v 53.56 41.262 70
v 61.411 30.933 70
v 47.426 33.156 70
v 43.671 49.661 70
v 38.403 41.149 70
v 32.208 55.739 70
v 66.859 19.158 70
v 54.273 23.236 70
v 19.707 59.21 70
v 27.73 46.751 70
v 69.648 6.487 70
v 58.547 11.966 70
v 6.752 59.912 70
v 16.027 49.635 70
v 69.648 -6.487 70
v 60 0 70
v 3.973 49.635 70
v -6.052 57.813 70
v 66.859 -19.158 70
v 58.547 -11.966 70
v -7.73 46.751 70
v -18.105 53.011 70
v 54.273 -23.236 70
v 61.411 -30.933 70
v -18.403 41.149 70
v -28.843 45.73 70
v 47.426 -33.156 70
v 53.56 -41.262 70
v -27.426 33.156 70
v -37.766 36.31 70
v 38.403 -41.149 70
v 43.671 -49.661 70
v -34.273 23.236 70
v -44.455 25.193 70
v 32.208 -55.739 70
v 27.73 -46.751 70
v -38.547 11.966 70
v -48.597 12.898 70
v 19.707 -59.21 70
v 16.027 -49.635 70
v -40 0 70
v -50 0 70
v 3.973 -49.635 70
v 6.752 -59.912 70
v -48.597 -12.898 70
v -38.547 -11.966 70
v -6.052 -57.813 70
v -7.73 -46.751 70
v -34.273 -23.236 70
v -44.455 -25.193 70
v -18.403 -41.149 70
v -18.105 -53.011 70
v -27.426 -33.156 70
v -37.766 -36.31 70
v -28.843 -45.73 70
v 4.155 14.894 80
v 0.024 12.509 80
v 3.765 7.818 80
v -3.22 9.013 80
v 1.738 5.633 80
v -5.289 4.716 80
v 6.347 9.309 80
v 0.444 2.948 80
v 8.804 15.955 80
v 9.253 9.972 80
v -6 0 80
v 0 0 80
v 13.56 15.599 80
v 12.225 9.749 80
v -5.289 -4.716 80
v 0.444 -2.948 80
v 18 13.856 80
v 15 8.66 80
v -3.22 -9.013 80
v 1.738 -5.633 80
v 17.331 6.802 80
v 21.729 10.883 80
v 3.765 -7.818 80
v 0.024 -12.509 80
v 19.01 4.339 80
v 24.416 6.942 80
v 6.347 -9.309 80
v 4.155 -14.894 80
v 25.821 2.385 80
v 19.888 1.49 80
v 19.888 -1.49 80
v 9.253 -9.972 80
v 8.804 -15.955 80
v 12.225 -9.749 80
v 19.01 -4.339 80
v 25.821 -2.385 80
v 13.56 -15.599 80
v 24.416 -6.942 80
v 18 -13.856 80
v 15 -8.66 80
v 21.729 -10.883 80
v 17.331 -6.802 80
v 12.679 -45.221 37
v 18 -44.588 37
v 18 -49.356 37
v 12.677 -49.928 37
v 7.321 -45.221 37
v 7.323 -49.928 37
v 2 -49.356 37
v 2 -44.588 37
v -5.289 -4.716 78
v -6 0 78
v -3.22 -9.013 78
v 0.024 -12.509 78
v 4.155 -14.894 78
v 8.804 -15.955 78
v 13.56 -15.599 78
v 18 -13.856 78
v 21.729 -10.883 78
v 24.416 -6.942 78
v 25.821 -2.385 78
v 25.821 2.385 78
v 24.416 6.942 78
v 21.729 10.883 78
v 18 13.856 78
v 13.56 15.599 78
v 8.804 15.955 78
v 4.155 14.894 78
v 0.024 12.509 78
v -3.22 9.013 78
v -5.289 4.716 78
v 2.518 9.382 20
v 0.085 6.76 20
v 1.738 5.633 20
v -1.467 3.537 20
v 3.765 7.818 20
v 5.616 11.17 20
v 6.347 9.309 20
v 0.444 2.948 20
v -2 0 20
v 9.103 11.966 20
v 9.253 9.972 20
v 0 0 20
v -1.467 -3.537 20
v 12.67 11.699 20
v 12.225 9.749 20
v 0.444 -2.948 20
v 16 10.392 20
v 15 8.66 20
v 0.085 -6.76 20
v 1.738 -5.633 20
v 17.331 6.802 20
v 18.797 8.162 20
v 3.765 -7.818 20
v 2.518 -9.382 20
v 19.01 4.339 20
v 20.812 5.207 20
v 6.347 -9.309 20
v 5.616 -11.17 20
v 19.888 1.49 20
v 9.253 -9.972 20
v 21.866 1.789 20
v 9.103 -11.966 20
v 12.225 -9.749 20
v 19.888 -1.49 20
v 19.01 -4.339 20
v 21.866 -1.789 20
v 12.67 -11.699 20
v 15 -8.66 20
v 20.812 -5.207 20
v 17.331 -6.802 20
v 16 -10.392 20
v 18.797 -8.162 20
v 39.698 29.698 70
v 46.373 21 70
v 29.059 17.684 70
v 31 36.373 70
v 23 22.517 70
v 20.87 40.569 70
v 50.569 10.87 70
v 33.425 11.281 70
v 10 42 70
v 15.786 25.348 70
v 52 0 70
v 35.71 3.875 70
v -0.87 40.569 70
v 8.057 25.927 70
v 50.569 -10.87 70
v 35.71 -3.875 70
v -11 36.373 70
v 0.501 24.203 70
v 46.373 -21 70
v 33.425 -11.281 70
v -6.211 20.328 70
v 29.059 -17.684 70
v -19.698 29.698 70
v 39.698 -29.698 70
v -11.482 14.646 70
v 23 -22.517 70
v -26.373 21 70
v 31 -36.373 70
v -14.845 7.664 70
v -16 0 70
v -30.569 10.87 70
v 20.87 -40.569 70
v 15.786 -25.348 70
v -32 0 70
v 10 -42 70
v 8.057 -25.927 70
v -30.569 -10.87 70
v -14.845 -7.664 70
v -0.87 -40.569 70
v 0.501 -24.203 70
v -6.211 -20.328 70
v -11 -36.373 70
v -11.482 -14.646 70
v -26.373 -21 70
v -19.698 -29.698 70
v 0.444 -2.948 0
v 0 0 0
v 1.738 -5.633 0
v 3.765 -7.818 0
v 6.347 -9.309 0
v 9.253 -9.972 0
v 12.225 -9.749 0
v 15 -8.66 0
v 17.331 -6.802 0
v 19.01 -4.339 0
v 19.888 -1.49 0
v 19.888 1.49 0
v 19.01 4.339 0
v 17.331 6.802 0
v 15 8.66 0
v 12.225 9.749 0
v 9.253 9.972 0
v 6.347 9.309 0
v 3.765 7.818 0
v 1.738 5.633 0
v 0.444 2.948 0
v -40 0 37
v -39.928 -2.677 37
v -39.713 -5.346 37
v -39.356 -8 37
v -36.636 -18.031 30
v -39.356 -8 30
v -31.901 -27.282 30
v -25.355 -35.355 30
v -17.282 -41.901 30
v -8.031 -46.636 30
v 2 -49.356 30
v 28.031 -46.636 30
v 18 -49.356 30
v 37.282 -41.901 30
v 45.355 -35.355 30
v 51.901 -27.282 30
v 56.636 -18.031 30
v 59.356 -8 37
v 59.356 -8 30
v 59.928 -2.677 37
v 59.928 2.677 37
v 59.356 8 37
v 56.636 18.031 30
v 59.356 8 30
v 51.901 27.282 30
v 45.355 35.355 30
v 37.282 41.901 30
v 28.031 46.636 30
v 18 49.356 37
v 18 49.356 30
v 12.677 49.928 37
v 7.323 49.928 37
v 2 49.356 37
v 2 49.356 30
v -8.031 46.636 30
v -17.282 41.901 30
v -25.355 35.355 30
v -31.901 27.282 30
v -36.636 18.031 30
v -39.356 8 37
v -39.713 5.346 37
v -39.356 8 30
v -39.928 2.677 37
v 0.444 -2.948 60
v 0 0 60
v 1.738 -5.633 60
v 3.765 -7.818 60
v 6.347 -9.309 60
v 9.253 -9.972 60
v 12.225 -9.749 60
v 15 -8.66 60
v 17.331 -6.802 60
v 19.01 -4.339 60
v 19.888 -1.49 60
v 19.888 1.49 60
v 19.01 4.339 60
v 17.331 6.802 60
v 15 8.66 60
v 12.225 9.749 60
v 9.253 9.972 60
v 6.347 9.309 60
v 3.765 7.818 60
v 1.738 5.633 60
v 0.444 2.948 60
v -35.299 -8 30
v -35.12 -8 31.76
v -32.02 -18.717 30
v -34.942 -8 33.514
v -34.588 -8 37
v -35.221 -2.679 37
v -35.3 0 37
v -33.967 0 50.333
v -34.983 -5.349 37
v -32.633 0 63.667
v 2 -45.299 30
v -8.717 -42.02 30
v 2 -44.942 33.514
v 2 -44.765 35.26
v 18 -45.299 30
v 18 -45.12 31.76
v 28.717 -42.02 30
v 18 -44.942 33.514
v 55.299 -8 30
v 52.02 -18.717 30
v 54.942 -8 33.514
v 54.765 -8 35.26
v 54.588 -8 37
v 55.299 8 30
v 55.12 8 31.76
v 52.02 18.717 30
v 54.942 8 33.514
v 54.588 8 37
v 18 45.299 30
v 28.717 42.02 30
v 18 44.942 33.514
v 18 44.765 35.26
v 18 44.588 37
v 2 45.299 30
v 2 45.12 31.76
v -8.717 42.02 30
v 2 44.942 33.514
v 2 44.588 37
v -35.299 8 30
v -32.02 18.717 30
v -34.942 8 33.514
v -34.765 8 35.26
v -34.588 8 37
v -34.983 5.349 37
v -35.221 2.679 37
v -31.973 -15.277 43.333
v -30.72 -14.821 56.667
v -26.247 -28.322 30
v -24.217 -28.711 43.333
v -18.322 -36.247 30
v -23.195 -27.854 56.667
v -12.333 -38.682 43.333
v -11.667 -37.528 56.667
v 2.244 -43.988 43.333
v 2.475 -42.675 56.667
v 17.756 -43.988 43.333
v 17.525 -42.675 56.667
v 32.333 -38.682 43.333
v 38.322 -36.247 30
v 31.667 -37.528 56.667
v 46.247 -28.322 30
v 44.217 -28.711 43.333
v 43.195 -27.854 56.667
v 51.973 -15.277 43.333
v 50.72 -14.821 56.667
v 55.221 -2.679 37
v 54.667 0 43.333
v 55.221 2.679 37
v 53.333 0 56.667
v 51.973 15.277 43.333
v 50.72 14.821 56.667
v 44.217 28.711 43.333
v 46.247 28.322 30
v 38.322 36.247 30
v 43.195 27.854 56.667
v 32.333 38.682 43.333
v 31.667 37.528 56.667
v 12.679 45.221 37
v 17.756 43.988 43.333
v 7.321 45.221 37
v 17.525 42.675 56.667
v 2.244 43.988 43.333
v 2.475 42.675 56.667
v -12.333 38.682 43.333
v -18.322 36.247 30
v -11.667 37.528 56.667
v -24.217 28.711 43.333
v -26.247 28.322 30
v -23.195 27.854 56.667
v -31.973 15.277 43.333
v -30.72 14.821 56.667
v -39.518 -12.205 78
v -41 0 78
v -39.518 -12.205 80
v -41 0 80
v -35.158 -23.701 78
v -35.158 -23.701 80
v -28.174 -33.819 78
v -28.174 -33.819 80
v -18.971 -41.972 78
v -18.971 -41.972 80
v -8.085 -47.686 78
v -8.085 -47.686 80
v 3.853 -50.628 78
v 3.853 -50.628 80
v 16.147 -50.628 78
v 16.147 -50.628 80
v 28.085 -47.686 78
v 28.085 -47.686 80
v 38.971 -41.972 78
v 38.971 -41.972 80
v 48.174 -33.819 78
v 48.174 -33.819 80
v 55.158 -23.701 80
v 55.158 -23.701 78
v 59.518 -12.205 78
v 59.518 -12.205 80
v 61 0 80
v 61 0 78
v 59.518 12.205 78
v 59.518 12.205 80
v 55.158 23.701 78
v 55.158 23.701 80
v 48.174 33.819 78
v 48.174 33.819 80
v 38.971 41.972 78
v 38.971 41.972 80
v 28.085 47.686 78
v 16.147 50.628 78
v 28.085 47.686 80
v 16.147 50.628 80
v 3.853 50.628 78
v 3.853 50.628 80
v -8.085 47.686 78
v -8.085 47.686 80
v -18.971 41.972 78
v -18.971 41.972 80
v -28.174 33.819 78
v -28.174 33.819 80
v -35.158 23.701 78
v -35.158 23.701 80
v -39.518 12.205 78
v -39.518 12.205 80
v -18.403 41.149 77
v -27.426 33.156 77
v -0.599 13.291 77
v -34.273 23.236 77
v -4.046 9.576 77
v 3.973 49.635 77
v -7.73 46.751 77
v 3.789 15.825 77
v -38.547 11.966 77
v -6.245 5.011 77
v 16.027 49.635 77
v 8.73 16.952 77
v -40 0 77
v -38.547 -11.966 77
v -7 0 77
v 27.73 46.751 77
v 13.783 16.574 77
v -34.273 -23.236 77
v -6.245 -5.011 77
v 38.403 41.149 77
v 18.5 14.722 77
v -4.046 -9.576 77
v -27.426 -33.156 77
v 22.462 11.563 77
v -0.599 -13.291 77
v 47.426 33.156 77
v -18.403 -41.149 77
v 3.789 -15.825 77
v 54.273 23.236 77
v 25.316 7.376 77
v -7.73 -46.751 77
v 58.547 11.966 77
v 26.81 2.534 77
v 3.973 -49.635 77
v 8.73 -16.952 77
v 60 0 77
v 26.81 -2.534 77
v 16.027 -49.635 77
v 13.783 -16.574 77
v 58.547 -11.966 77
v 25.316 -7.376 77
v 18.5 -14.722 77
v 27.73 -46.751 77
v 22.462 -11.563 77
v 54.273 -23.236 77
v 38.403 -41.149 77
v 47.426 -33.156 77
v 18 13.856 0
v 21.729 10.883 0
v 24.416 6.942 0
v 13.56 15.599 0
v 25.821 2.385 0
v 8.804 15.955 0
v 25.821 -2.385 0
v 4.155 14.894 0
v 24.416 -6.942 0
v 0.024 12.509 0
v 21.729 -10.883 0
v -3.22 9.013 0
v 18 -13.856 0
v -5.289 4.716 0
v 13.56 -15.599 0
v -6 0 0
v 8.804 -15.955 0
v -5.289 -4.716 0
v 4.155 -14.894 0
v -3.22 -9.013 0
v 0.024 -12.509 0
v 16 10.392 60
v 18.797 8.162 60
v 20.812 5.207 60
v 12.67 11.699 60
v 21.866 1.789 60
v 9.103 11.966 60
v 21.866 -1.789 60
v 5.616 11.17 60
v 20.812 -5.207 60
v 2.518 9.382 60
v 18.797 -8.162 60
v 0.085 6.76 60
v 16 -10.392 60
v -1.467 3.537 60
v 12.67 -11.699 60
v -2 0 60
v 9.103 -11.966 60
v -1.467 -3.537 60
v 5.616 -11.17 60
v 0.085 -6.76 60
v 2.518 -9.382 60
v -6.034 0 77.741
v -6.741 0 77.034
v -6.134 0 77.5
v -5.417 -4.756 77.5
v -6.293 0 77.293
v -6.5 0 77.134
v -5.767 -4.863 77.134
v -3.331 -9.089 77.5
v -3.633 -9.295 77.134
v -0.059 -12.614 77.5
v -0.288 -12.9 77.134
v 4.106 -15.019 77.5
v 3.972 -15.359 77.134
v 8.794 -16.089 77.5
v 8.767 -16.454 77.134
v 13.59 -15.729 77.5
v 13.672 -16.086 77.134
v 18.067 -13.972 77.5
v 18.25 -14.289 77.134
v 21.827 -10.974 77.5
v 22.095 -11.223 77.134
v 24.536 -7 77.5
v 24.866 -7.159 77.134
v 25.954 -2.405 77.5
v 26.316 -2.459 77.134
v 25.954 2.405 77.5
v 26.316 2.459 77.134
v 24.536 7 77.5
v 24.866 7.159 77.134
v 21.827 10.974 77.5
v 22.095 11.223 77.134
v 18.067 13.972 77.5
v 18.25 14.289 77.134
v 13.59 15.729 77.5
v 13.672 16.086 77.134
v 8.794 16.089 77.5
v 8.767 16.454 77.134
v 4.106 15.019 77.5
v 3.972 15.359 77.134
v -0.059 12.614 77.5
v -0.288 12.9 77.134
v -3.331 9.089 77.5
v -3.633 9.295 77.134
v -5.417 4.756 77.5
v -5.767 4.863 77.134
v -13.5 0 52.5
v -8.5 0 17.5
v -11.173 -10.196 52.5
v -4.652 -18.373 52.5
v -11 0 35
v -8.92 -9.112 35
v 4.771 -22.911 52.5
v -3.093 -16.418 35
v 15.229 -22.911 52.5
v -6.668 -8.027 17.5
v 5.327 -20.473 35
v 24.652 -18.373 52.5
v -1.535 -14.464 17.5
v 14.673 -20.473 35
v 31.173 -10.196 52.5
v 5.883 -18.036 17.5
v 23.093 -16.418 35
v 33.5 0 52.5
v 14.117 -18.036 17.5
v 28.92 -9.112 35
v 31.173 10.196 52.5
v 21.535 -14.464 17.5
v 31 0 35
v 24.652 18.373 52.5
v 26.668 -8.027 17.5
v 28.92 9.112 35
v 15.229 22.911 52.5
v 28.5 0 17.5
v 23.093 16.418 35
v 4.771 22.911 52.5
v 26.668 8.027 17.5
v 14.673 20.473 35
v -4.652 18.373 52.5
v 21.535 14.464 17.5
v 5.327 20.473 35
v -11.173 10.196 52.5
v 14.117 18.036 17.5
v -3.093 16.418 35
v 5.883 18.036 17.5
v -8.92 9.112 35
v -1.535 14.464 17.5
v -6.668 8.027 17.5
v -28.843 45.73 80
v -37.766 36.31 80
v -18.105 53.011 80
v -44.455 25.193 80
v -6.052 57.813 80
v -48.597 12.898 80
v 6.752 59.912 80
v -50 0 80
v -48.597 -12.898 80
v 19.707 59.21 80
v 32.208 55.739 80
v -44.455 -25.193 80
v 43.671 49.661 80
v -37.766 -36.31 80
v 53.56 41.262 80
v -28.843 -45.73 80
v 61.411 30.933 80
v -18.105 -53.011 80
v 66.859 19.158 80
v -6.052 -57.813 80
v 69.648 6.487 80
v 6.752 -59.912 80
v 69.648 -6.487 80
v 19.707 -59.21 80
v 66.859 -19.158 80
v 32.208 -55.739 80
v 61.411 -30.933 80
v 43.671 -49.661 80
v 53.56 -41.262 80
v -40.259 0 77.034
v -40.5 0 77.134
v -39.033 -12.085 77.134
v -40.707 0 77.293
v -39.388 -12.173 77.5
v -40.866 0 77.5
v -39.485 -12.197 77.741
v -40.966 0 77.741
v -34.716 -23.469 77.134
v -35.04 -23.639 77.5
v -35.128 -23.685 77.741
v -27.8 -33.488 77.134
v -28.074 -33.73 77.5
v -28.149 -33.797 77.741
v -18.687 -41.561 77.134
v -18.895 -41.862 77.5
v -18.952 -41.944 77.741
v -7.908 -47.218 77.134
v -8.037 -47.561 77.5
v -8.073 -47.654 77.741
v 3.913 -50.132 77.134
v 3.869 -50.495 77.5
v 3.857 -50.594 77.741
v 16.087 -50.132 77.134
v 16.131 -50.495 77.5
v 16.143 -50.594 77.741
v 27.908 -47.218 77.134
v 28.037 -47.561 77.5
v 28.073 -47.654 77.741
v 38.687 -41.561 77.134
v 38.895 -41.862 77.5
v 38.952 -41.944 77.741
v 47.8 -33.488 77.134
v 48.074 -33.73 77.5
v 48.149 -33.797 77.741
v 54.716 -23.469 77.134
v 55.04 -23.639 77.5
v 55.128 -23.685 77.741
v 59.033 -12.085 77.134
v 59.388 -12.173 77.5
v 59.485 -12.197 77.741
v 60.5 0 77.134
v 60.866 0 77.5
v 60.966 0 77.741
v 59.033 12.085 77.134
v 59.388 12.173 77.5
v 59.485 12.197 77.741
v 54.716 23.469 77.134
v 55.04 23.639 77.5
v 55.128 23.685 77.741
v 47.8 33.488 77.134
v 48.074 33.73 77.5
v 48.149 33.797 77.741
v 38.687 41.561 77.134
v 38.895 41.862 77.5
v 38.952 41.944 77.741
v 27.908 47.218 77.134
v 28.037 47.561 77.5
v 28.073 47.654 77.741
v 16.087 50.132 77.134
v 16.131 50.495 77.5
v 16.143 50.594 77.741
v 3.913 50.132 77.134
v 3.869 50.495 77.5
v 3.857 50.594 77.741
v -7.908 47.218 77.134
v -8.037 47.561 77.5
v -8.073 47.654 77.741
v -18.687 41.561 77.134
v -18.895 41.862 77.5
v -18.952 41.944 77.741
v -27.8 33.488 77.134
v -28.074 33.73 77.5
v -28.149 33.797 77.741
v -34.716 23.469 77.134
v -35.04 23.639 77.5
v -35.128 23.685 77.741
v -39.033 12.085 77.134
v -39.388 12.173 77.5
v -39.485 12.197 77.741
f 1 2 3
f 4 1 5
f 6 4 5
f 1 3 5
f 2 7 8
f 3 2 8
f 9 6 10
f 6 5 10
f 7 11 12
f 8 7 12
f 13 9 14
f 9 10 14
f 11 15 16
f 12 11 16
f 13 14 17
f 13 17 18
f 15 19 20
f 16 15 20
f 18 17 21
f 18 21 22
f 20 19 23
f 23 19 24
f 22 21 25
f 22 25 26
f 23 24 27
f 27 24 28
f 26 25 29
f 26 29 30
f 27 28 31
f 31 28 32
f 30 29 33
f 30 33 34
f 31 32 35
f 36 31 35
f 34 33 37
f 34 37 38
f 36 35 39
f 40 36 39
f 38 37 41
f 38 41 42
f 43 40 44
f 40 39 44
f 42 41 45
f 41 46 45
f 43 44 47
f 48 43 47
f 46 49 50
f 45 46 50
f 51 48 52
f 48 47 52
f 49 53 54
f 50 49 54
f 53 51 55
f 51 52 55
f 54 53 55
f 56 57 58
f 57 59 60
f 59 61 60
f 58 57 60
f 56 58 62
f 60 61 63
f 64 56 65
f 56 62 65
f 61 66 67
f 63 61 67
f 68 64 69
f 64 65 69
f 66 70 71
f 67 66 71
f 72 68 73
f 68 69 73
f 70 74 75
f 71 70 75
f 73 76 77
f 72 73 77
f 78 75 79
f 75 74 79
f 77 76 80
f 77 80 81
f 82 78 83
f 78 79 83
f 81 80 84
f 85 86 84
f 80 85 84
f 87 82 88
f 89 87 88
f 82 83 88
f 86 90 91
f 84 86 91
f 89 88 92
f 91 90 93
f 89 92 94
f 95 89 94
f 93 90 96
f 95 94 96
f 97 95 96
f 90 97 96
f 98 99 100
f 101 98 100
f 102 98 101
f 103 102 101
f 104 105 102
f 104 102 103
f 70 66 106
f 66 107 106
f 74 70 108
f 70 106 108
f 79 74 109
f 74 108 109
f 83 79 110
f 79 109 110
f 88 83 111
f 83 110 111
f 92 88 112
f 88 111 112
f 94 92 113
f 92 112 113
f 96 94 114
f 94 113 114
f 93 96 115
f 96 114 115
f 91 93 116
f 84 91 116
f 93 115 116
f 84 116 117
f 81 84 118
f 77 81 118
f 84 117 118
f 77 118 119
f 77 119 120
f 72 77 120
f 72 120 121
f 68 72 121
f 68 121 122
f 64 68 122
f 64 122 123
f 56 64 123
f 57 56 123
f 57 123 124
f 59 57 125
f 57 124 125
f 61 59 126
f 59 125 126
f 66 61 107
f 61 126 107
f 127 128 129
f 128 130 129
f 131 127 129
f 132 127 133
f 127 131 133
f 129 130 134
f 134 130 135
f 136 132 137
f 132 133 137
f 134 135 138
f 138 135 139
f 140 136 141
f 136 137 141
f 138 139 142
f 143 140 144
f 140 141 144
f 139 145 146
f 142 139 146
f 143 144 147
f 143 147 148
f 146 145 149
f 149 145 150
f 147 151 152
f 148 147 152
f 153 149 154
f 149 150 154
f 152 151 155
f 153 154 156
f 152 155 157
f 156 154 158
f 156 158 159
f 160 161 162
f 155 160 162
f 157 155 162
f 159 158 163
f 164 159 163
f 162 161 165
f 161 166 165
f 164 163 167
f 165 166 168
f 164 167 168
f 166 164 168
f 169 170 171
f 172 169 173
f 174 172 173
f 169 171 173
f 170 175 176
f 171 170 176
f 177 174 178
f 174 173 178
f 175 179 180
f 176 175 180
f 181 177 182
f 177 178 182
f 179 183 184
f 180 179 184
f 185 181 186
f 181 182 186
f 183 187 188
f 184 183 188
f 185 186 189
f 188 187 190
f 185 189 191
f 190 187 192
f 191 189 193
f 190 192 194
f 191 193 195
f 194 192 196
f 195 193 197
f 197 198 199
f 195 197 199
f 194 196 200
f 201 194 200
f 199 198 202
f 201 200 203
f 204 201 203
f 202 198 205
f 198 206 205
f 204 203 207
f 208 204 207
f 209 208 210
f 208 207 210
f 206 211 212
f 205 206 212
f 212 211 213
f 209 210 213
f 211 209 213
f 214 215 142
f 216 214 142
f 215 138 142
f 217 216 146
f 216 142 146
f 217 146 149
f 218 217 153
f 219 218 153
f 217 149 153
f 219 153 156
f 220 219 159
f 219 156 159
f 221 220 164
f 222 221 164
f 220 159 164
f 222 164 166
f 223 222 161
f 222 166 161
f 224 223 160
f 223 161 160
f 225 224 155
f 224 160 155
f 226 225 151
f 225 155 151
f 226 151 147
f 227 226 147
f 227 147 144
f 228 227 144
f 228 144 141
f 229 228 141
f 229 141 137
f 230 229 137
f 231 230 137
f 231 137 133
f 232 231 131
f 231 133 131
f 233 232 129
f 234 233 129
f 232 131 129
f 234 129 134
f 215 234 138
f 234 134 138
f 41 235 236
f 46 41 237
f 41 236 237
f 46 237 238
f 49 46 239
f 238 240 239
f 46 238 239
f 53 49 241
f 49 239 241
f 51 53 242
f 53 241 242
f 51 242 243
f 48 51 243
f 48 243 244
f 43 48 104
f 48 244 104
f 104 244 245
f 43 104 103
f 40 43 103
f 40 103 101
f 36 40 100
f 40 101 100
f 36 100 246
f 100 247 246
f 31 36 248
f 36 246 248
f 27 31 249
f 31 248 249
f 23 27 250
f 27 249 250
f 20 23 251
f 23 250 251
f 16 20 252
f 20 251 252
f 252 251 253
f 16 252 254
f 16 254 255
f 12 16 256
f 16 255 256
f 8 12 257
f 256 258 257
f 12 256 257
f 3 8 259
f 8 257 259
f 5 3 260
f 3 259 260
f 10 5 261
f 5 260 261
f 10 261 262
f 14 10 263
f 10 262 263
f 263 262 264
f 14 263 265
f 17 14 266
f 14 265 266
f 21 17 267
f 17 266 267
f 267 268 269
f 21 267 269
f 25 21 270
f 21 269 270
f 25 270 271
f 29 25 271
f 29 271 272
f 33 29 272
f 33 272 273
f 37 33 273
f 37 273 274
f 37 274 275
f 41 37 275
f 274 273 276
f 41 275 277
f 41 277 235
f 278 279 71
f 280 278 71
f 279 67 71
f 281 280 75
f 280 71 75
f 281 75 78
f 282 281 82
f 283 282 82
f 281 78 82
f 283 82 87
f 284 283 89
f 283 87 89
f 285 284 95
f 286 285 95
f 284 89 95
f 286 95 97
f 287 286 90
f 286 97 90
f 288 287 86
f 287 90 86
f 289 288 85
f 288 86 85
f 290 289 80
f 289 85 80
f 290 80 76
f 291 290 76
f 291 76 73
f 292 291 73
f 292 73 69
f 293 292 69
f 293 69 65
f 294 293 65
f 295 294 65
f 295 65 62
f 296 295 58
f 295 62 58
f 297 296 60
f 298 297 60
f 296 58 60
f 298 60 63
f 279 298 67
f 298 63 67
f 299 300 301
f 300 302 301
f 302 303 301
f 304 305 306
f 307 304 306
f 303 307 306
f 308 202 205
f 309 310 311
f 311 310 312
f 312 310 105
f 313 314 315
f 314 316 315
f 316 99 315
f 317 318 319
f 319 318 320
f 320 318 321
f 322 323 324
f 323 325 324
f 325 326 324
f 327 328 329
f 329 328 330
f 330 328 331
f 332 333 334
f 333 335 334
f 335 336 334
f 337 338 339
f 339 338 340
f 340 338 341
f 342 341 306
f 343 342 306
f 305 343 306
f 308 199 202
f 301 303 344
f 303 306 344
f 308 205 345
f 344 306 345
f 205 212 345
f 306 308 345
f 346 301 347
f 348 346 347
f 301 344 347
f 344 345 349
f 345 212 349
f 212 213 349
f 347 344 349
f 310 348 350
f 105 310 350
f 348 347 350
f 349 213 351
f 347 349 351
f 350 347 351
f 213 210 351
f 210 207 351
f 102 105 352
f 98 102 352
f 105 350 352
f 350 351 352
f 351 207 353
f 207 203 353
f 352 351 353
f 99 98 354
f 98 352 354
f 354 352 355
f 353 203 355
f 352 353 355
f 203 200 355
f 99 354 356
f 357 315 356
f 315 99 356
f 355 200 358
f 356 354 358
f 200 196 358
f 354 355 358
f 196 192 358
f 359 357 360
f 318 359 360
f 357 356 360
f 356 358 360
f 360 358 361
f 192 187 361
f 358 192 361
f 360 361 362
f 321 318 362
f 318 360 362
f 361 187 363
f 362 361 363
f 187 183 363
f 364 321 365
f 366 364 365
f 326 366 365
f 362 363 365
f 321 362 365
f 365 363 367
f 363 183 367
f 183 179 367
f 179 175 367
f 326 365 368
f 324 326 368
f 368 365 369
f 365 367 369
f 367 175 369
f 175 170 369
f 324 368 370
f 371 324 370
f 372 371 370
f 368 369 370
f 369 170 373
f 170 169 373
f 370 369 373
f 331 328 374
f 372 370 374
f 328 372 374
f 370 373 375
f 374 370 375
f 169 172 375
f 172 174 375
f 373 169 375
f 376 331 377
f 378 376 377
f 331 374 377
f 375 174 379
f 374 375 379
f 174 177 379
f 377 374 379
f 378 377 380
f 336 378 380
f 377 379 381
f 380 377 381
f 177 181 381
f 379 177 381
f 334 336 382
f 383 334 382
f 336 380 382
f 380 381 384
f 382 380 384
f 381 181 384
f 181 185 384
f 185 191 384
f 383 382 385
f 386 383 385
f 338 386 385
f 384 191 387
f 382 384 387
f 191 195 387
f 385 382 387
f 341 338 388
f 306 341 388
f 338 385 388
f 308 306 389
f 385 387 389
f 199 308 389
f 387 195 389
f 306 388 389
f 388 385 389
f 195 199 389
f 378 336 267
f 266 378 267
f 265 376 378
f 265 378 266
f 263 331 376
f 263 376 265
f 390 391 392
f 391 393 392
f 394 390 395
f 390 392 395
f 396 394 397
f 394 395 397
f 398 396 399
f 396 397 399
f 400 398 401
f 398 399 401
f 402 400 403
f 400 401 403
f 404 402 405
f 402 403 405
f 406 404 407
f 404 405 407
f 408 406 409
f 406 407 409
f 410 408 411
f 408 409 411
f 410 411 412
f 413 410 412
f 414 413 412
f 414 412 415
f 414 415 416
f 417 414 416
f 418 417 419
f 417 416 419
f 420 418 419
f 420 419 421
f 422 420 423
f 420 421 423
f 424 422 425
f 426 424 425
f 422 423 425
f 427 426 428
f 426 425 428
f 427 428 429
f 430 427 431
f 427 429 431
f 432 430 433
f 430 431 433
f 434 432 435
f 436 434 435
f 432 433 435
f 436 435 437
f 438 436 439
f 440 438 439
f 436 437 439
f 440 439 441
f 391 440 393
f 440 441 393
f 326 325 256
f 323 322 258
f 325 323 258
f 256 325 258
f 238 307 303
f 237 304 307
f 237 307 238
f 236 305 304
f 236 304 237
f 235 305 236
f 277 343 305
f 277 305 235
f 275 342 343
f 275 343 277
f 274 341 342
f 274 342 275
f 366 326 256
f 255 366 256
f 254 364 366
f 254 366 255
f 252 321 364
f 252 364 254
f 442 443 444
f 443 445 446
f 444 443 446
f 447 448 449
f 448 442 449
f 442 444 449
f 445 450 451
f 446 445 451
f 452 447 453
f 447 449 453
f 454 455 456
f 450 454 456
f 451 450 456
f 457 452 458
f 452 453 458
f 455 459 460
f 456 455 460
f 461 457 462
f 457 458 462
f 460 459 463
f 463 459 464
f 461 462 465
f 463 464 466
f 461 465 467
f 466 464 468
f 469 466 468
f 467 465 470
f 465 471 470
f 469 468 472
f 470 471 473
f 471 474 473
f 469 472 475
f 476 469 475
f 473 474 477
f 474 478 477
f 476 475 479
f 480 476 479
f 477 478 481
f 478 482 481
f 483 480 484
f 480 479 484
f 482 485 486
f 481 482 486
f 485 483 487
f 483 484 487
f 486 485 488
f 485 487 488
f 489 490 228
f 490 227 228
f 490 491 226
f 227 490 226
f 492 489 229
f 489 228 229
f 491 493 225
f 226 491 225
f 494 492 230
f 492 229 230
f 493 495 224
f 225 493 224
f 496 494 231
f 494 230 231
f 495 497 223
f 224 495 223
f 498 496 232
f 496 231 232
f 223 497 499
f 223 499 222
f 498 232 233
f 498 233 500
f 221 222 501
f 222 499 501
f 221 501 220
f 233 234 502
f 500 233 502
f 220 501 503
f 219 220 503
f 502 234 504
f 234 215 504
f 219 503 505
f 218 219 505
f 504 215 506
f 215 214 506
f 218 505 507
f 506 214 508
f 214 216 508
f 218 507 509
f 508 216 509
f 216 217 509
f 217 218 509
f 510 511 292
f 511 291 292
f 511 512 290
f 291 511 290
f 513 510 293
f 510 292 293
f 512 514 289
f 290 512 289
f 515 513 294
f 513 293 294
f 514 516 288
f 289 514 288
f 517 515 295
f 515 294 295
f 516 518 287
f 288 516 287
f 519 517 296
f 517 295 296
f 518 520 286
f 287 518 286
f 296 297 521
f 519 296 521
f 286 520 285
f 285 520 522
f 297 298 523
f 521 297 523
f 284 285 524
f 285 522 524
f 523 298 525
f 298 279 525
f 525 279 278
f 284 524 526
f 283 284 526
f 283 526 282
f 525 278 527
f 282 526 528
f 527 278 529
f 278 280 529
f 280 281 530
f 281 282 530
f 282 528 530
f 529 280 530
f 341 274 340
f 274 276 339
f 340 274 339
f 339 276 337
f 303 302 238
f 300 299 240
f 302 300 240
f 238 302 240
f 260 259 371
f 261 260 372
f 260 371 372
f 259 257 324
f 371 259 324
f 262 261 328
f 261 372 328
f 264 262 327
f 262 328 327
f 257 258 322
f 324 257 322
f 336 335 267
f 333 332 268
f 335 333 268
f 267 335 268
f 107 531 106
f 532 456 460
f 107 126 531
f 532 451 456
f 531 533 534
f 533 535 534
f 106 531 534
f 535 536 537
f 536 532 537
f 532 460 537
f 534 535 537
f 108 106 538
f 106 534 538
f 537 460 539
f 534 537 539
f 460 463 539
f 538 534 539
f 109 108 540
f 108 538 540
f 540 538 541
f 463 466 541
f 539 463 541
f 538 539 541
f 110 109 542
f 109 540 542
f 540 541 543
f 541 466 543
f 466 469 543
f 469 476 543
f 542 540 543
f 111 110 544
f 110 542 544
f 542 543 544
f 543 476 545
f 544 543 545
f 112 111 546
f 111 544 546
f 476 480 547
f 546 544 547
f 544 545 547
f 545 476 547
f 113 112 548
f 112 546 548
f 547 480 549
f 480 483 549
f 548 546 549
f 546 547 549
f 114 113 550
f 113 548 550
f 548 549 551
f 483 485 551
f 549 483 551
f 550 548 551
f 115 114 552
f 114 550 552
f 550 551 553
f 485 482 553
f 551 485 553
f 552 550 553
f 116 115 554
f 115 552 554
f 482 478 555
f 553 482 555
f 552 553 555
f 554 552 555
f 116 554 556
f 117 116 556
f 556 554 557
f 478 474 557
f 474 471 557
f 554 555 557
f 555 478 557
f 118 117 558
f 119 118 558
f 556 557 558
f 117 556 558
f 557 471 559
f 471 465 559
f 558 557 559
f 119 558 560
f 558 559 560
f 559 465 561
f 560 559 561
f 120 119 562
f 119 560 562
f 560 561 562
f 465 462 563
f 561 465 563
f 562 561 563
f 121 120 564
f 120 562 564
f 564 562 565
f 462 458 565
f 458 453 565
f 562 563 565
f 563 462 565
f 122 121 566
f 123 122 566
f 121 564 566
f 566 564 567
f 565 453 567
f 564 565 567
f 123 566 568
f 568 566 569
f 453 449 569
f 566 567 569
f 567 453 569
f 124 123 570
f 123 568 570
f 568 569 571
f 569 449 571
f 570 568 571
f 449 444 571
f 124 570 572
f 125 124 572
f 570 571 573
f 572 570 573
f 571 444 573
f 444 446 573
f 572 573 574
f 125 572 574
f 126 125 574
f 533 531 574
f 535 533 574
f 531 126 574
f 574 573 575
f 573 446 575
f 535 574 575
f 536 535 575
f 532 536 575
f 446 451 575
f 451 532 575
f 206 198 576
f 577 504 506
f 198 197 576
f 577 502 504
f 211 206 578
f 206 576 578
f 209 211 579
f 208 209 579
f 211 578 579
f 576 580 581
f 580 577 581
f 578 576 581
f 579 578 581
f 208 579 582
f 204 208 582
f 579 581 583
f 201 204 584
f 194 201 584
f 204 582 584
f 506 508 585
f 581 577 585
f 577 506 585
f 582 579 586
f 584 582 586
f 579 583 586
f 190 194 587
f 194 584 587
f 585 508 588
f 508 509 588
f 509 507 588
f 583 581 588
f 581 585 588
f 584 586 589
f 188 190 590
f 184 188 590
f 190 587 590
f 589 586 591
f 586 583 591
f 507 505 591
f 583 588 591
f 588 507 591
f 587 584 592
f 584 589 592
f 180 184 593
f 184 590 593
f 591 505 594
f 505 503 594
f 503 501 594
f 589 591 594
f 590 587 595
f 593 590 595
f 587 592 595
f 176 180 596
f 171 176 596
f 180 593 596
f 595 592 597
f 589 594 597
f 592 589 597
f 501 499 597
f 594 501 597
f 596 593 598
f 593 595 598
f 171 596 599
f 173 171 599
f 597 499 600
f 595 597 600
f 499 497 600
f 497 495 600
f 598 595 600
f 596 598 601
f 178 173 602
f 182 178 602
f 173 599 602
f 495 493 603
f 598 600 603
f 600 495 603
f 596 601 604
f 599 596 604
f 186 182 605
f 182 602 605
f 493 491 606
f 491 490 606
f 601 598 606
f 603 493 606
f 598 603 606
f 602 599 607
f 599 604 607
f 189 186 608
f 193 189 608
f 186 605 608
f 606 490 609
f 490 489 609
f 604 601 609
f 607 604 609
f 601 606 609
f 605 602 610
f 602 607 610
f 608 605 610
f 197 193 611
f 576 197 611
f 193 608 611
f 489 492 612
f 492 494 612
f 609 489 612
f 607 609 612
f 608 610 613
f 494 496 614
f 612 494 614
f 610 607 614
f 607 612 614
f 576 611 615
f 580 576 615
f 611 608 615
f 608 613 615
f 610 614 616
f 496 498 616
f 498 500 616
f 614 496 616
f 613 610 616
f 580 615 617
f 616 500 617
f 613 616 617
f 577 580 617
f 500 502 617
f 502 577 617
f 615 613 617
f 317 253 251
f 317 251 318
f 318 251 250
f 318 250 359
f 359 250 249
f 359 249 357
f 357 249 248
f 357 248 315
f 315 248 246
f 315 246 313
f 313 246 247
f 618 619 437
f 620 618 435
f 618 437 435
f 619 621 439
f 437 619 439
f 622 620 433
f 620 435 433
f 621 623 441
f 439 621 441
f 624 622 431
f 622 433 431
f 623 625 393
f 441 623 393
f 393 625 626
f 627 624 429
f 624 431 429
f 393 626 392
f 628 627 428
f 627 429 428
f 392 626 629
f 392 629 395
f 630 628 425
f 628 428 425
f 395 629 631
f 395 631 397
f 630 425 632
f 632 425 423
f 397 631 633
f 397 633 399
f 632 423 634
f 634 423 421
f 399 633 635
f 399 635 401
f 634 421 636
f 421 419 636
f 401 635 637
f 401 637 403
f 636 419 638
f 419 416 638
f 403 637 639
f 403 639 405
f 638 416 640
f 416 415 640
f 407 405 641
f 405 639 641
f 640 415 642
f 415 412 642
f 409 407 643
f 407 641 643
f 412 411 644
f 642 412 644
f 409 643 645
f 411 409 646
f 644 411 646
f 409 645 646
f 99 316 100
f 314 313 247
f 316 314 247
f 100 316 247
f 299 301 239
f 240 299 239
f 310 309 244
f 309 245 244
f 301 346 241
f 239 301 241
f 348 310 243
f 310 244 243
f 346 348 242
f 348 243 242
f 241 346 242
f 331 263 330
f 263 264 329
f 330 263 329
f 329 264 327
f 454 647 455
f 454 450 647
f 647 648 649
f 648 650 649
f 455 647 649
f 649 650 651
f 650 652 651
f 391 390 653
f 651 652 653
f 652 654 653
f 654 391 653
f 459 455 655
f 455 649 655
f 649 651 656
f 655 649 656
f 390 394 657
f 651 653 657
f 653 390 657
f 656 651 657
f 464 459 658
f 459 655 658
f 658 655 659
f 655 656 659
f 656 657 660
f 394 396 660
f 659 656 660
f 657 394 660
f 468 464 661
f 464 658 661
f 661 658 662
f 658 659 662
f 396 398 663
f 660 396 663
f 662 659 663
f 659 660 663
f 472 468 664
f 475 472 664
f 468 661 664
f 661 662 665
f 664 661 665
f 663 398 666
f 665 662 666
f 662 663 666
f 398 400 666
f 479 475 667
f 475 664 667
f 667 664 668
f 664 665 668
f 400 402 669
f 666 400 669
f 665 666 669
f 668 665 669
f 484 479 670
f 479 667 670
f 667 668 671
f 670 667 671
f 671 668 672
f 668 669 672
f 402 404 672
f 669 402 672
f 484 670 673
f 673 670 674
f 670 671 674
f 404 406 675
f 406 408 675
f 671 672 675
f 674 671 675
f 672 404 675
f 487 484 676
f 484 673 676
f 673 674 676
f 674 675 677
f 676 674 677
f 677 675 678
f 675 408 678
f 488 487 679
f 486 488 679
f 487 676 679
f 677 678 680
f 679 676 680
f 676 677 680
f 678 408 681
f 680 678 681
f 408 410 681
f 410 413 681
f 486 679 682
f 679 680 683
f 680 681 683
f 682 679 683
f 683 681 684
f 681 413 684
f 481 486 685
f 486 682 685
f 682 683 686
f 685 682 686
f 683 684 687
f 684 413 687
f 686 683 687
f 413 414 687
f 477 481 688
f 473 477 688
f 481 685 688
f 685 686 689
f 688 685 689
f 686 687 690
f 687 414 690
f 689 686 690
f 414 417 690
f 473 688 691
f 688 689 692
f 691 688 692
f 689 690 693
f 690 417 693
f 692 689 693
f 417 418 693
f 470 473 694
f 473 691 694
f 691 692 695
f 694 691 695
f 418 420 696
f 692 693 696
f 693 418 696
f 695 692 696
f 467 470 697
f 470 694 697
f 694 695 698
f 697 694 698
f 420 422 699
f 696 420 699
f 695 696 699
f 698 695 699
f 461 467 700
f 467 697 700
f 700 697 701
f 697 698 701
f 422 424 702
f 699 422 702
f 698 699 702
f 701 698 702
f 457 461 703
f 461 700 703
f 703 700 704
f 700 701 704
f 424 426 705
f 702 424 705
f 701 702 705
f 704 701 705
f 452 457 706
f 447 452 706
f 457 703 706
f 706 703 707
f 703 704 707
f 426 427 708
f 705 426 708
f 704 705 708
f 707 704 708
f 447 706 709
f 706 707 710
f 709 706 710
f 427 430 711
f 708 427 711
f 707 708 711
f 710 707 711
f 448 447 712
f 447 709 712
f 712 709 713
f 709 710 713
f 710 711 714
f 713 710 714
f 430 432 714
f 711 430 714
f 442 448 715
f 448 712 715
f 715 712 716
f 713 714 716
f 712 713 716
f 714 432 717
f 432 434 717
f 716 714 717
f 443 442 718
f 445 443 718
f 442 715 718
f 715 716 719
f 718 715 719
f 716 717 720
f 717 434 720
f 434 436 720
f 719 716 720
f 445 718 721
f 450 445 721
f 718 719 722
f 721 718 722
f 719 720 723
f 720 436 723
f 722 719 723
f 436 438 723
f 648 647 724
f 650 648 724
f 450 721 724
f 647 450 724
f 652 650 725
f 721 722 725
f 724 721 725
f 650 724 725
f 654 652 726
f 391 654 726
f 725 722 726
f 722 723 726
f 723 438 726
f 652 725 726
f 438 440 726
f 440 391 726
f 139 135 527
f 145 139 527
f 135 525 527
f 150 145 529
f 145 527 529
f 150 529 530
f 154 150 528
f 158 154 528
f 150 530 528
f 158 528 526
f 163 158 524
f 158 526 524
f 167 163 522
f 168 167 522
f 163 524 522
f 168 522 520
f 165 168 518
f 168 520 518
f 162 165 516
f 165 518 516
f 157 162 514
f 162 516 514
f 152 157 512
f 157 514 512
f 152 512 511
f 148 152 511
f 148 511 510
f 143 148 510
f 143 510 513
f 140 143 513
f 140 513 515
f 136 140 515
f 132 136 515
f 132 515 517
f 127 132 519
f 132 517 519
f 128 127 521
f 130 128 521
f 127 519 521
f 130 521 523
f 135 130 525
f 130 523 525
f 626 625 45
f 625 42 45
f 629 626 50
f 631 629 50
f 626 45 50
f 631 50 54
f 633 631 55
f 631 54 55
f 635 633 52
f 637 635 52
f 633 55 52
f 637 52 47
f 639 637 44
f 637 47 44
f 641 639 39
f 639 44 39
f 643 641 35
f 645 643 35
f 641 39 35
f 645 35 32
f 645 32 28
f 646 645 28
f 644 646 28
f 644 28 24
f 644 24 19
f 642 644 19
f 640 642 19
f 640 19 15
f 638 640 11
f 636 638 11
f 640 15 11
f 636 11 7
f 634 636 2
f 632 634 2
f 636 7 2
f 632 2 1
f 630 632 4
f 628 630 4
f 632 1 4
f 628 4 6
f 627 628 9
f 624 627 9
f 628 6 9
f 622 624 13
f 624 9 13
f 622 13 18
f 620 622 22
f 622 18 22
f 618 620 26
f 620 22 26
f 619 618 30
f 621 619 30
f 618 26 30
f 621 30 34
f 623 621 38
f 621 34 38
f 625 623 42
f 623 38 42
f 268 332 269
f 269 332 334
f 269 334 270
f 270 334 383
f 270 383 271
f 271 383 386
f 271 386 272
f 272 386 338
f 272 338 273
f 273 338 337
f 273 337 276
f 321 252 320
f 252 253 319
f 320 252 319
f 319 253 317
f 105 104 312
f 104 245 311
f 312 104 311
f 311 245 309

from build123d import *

# Parameters (mm, degrees)
CUT_EXTRUDE2_DEPTH = 7
CIRPATTERN1_COUNT  = 4


with BuildPart() as part:
    # Sketch2 → Revolve1 (revolve)
    with BuildSketch(Plane(origin=(0, 0, 0), x_dir=(1, 0, 0), z_dir=(0, 1, 0))):
        with BuildLine():
            Line((-50, -80), (-50, -70))
            Line((-50, -70), (-40, -70))
            Line((-40, -70), (-40, -30))
            Line((-40, -30), (-36, -30))
            Line((-36, -30), (-32, -70))
            Line((-32, -70), (-16, -70))
            Line((-16, -70), (-6, 0))
            Line((-6, 0), (0, 0))
            Line((0, 0), (0, -20))
            Line((0, -20), (-2, -20))
            Line((-2, -20), (-2, -60))
            Line((-2, -60), (0, -60))
            Line((0, -60), (0, -80))
            Line((0, -80), (-6, -80))
            Line((-6, -80), (-6, -78))
            ThreePointArc((-6, -78), (-6.292893219, -77.292893219), (-7, -77))
            Line((-7, -77), (-40, -77))
            ThreePointArc((-40, -77), (-40.707106781, -77.292893219), (-41, -78))
            Line((-41, -78), (-41, -80))
            Line((-41, -80), (-50, -80))
        make_face()
    revolve(axis=Axis((10, 0, 0), (0, 0, 1)))

    # Sketch3 → Cut-Extrude2 (cut)
    with BuildSketch(Plane(origin=(0, 0, 30), x_dir=(-1, 0, 0), z_dir=(0, 0, -1))):
        with BuildLine():
            ThreePointArc((39.355850717, -8), (40, 0), (39.355850717, 8))
            Line((39.355850717, 8), (31.231056256, 8))
            ThreePointArc((31.231056256, 8), (32, 0), (31.231056256, -8))
            Line((31.231056256, -8), (39.355850717, -8))
        make_face()
    cut_extrude2 = extrude(amount=-CUT_EXTRUDE2_DEPTH, mode=Mode.SUBTRACT)

    # CirPattern1: Cut-Extrude2 ×4 about axis
    cirpattern1_axis = Axis((10, 0, 30), (0, 0, -1))
    for i in range(1, CIRPATTERN1_COUNT):
        add(cut_extrude2.rotate(cirpattern1_axis, i * 360 / CIRPATTERN1_COUNT), mode=Mode.SUBTRACT)


solid = part.part
